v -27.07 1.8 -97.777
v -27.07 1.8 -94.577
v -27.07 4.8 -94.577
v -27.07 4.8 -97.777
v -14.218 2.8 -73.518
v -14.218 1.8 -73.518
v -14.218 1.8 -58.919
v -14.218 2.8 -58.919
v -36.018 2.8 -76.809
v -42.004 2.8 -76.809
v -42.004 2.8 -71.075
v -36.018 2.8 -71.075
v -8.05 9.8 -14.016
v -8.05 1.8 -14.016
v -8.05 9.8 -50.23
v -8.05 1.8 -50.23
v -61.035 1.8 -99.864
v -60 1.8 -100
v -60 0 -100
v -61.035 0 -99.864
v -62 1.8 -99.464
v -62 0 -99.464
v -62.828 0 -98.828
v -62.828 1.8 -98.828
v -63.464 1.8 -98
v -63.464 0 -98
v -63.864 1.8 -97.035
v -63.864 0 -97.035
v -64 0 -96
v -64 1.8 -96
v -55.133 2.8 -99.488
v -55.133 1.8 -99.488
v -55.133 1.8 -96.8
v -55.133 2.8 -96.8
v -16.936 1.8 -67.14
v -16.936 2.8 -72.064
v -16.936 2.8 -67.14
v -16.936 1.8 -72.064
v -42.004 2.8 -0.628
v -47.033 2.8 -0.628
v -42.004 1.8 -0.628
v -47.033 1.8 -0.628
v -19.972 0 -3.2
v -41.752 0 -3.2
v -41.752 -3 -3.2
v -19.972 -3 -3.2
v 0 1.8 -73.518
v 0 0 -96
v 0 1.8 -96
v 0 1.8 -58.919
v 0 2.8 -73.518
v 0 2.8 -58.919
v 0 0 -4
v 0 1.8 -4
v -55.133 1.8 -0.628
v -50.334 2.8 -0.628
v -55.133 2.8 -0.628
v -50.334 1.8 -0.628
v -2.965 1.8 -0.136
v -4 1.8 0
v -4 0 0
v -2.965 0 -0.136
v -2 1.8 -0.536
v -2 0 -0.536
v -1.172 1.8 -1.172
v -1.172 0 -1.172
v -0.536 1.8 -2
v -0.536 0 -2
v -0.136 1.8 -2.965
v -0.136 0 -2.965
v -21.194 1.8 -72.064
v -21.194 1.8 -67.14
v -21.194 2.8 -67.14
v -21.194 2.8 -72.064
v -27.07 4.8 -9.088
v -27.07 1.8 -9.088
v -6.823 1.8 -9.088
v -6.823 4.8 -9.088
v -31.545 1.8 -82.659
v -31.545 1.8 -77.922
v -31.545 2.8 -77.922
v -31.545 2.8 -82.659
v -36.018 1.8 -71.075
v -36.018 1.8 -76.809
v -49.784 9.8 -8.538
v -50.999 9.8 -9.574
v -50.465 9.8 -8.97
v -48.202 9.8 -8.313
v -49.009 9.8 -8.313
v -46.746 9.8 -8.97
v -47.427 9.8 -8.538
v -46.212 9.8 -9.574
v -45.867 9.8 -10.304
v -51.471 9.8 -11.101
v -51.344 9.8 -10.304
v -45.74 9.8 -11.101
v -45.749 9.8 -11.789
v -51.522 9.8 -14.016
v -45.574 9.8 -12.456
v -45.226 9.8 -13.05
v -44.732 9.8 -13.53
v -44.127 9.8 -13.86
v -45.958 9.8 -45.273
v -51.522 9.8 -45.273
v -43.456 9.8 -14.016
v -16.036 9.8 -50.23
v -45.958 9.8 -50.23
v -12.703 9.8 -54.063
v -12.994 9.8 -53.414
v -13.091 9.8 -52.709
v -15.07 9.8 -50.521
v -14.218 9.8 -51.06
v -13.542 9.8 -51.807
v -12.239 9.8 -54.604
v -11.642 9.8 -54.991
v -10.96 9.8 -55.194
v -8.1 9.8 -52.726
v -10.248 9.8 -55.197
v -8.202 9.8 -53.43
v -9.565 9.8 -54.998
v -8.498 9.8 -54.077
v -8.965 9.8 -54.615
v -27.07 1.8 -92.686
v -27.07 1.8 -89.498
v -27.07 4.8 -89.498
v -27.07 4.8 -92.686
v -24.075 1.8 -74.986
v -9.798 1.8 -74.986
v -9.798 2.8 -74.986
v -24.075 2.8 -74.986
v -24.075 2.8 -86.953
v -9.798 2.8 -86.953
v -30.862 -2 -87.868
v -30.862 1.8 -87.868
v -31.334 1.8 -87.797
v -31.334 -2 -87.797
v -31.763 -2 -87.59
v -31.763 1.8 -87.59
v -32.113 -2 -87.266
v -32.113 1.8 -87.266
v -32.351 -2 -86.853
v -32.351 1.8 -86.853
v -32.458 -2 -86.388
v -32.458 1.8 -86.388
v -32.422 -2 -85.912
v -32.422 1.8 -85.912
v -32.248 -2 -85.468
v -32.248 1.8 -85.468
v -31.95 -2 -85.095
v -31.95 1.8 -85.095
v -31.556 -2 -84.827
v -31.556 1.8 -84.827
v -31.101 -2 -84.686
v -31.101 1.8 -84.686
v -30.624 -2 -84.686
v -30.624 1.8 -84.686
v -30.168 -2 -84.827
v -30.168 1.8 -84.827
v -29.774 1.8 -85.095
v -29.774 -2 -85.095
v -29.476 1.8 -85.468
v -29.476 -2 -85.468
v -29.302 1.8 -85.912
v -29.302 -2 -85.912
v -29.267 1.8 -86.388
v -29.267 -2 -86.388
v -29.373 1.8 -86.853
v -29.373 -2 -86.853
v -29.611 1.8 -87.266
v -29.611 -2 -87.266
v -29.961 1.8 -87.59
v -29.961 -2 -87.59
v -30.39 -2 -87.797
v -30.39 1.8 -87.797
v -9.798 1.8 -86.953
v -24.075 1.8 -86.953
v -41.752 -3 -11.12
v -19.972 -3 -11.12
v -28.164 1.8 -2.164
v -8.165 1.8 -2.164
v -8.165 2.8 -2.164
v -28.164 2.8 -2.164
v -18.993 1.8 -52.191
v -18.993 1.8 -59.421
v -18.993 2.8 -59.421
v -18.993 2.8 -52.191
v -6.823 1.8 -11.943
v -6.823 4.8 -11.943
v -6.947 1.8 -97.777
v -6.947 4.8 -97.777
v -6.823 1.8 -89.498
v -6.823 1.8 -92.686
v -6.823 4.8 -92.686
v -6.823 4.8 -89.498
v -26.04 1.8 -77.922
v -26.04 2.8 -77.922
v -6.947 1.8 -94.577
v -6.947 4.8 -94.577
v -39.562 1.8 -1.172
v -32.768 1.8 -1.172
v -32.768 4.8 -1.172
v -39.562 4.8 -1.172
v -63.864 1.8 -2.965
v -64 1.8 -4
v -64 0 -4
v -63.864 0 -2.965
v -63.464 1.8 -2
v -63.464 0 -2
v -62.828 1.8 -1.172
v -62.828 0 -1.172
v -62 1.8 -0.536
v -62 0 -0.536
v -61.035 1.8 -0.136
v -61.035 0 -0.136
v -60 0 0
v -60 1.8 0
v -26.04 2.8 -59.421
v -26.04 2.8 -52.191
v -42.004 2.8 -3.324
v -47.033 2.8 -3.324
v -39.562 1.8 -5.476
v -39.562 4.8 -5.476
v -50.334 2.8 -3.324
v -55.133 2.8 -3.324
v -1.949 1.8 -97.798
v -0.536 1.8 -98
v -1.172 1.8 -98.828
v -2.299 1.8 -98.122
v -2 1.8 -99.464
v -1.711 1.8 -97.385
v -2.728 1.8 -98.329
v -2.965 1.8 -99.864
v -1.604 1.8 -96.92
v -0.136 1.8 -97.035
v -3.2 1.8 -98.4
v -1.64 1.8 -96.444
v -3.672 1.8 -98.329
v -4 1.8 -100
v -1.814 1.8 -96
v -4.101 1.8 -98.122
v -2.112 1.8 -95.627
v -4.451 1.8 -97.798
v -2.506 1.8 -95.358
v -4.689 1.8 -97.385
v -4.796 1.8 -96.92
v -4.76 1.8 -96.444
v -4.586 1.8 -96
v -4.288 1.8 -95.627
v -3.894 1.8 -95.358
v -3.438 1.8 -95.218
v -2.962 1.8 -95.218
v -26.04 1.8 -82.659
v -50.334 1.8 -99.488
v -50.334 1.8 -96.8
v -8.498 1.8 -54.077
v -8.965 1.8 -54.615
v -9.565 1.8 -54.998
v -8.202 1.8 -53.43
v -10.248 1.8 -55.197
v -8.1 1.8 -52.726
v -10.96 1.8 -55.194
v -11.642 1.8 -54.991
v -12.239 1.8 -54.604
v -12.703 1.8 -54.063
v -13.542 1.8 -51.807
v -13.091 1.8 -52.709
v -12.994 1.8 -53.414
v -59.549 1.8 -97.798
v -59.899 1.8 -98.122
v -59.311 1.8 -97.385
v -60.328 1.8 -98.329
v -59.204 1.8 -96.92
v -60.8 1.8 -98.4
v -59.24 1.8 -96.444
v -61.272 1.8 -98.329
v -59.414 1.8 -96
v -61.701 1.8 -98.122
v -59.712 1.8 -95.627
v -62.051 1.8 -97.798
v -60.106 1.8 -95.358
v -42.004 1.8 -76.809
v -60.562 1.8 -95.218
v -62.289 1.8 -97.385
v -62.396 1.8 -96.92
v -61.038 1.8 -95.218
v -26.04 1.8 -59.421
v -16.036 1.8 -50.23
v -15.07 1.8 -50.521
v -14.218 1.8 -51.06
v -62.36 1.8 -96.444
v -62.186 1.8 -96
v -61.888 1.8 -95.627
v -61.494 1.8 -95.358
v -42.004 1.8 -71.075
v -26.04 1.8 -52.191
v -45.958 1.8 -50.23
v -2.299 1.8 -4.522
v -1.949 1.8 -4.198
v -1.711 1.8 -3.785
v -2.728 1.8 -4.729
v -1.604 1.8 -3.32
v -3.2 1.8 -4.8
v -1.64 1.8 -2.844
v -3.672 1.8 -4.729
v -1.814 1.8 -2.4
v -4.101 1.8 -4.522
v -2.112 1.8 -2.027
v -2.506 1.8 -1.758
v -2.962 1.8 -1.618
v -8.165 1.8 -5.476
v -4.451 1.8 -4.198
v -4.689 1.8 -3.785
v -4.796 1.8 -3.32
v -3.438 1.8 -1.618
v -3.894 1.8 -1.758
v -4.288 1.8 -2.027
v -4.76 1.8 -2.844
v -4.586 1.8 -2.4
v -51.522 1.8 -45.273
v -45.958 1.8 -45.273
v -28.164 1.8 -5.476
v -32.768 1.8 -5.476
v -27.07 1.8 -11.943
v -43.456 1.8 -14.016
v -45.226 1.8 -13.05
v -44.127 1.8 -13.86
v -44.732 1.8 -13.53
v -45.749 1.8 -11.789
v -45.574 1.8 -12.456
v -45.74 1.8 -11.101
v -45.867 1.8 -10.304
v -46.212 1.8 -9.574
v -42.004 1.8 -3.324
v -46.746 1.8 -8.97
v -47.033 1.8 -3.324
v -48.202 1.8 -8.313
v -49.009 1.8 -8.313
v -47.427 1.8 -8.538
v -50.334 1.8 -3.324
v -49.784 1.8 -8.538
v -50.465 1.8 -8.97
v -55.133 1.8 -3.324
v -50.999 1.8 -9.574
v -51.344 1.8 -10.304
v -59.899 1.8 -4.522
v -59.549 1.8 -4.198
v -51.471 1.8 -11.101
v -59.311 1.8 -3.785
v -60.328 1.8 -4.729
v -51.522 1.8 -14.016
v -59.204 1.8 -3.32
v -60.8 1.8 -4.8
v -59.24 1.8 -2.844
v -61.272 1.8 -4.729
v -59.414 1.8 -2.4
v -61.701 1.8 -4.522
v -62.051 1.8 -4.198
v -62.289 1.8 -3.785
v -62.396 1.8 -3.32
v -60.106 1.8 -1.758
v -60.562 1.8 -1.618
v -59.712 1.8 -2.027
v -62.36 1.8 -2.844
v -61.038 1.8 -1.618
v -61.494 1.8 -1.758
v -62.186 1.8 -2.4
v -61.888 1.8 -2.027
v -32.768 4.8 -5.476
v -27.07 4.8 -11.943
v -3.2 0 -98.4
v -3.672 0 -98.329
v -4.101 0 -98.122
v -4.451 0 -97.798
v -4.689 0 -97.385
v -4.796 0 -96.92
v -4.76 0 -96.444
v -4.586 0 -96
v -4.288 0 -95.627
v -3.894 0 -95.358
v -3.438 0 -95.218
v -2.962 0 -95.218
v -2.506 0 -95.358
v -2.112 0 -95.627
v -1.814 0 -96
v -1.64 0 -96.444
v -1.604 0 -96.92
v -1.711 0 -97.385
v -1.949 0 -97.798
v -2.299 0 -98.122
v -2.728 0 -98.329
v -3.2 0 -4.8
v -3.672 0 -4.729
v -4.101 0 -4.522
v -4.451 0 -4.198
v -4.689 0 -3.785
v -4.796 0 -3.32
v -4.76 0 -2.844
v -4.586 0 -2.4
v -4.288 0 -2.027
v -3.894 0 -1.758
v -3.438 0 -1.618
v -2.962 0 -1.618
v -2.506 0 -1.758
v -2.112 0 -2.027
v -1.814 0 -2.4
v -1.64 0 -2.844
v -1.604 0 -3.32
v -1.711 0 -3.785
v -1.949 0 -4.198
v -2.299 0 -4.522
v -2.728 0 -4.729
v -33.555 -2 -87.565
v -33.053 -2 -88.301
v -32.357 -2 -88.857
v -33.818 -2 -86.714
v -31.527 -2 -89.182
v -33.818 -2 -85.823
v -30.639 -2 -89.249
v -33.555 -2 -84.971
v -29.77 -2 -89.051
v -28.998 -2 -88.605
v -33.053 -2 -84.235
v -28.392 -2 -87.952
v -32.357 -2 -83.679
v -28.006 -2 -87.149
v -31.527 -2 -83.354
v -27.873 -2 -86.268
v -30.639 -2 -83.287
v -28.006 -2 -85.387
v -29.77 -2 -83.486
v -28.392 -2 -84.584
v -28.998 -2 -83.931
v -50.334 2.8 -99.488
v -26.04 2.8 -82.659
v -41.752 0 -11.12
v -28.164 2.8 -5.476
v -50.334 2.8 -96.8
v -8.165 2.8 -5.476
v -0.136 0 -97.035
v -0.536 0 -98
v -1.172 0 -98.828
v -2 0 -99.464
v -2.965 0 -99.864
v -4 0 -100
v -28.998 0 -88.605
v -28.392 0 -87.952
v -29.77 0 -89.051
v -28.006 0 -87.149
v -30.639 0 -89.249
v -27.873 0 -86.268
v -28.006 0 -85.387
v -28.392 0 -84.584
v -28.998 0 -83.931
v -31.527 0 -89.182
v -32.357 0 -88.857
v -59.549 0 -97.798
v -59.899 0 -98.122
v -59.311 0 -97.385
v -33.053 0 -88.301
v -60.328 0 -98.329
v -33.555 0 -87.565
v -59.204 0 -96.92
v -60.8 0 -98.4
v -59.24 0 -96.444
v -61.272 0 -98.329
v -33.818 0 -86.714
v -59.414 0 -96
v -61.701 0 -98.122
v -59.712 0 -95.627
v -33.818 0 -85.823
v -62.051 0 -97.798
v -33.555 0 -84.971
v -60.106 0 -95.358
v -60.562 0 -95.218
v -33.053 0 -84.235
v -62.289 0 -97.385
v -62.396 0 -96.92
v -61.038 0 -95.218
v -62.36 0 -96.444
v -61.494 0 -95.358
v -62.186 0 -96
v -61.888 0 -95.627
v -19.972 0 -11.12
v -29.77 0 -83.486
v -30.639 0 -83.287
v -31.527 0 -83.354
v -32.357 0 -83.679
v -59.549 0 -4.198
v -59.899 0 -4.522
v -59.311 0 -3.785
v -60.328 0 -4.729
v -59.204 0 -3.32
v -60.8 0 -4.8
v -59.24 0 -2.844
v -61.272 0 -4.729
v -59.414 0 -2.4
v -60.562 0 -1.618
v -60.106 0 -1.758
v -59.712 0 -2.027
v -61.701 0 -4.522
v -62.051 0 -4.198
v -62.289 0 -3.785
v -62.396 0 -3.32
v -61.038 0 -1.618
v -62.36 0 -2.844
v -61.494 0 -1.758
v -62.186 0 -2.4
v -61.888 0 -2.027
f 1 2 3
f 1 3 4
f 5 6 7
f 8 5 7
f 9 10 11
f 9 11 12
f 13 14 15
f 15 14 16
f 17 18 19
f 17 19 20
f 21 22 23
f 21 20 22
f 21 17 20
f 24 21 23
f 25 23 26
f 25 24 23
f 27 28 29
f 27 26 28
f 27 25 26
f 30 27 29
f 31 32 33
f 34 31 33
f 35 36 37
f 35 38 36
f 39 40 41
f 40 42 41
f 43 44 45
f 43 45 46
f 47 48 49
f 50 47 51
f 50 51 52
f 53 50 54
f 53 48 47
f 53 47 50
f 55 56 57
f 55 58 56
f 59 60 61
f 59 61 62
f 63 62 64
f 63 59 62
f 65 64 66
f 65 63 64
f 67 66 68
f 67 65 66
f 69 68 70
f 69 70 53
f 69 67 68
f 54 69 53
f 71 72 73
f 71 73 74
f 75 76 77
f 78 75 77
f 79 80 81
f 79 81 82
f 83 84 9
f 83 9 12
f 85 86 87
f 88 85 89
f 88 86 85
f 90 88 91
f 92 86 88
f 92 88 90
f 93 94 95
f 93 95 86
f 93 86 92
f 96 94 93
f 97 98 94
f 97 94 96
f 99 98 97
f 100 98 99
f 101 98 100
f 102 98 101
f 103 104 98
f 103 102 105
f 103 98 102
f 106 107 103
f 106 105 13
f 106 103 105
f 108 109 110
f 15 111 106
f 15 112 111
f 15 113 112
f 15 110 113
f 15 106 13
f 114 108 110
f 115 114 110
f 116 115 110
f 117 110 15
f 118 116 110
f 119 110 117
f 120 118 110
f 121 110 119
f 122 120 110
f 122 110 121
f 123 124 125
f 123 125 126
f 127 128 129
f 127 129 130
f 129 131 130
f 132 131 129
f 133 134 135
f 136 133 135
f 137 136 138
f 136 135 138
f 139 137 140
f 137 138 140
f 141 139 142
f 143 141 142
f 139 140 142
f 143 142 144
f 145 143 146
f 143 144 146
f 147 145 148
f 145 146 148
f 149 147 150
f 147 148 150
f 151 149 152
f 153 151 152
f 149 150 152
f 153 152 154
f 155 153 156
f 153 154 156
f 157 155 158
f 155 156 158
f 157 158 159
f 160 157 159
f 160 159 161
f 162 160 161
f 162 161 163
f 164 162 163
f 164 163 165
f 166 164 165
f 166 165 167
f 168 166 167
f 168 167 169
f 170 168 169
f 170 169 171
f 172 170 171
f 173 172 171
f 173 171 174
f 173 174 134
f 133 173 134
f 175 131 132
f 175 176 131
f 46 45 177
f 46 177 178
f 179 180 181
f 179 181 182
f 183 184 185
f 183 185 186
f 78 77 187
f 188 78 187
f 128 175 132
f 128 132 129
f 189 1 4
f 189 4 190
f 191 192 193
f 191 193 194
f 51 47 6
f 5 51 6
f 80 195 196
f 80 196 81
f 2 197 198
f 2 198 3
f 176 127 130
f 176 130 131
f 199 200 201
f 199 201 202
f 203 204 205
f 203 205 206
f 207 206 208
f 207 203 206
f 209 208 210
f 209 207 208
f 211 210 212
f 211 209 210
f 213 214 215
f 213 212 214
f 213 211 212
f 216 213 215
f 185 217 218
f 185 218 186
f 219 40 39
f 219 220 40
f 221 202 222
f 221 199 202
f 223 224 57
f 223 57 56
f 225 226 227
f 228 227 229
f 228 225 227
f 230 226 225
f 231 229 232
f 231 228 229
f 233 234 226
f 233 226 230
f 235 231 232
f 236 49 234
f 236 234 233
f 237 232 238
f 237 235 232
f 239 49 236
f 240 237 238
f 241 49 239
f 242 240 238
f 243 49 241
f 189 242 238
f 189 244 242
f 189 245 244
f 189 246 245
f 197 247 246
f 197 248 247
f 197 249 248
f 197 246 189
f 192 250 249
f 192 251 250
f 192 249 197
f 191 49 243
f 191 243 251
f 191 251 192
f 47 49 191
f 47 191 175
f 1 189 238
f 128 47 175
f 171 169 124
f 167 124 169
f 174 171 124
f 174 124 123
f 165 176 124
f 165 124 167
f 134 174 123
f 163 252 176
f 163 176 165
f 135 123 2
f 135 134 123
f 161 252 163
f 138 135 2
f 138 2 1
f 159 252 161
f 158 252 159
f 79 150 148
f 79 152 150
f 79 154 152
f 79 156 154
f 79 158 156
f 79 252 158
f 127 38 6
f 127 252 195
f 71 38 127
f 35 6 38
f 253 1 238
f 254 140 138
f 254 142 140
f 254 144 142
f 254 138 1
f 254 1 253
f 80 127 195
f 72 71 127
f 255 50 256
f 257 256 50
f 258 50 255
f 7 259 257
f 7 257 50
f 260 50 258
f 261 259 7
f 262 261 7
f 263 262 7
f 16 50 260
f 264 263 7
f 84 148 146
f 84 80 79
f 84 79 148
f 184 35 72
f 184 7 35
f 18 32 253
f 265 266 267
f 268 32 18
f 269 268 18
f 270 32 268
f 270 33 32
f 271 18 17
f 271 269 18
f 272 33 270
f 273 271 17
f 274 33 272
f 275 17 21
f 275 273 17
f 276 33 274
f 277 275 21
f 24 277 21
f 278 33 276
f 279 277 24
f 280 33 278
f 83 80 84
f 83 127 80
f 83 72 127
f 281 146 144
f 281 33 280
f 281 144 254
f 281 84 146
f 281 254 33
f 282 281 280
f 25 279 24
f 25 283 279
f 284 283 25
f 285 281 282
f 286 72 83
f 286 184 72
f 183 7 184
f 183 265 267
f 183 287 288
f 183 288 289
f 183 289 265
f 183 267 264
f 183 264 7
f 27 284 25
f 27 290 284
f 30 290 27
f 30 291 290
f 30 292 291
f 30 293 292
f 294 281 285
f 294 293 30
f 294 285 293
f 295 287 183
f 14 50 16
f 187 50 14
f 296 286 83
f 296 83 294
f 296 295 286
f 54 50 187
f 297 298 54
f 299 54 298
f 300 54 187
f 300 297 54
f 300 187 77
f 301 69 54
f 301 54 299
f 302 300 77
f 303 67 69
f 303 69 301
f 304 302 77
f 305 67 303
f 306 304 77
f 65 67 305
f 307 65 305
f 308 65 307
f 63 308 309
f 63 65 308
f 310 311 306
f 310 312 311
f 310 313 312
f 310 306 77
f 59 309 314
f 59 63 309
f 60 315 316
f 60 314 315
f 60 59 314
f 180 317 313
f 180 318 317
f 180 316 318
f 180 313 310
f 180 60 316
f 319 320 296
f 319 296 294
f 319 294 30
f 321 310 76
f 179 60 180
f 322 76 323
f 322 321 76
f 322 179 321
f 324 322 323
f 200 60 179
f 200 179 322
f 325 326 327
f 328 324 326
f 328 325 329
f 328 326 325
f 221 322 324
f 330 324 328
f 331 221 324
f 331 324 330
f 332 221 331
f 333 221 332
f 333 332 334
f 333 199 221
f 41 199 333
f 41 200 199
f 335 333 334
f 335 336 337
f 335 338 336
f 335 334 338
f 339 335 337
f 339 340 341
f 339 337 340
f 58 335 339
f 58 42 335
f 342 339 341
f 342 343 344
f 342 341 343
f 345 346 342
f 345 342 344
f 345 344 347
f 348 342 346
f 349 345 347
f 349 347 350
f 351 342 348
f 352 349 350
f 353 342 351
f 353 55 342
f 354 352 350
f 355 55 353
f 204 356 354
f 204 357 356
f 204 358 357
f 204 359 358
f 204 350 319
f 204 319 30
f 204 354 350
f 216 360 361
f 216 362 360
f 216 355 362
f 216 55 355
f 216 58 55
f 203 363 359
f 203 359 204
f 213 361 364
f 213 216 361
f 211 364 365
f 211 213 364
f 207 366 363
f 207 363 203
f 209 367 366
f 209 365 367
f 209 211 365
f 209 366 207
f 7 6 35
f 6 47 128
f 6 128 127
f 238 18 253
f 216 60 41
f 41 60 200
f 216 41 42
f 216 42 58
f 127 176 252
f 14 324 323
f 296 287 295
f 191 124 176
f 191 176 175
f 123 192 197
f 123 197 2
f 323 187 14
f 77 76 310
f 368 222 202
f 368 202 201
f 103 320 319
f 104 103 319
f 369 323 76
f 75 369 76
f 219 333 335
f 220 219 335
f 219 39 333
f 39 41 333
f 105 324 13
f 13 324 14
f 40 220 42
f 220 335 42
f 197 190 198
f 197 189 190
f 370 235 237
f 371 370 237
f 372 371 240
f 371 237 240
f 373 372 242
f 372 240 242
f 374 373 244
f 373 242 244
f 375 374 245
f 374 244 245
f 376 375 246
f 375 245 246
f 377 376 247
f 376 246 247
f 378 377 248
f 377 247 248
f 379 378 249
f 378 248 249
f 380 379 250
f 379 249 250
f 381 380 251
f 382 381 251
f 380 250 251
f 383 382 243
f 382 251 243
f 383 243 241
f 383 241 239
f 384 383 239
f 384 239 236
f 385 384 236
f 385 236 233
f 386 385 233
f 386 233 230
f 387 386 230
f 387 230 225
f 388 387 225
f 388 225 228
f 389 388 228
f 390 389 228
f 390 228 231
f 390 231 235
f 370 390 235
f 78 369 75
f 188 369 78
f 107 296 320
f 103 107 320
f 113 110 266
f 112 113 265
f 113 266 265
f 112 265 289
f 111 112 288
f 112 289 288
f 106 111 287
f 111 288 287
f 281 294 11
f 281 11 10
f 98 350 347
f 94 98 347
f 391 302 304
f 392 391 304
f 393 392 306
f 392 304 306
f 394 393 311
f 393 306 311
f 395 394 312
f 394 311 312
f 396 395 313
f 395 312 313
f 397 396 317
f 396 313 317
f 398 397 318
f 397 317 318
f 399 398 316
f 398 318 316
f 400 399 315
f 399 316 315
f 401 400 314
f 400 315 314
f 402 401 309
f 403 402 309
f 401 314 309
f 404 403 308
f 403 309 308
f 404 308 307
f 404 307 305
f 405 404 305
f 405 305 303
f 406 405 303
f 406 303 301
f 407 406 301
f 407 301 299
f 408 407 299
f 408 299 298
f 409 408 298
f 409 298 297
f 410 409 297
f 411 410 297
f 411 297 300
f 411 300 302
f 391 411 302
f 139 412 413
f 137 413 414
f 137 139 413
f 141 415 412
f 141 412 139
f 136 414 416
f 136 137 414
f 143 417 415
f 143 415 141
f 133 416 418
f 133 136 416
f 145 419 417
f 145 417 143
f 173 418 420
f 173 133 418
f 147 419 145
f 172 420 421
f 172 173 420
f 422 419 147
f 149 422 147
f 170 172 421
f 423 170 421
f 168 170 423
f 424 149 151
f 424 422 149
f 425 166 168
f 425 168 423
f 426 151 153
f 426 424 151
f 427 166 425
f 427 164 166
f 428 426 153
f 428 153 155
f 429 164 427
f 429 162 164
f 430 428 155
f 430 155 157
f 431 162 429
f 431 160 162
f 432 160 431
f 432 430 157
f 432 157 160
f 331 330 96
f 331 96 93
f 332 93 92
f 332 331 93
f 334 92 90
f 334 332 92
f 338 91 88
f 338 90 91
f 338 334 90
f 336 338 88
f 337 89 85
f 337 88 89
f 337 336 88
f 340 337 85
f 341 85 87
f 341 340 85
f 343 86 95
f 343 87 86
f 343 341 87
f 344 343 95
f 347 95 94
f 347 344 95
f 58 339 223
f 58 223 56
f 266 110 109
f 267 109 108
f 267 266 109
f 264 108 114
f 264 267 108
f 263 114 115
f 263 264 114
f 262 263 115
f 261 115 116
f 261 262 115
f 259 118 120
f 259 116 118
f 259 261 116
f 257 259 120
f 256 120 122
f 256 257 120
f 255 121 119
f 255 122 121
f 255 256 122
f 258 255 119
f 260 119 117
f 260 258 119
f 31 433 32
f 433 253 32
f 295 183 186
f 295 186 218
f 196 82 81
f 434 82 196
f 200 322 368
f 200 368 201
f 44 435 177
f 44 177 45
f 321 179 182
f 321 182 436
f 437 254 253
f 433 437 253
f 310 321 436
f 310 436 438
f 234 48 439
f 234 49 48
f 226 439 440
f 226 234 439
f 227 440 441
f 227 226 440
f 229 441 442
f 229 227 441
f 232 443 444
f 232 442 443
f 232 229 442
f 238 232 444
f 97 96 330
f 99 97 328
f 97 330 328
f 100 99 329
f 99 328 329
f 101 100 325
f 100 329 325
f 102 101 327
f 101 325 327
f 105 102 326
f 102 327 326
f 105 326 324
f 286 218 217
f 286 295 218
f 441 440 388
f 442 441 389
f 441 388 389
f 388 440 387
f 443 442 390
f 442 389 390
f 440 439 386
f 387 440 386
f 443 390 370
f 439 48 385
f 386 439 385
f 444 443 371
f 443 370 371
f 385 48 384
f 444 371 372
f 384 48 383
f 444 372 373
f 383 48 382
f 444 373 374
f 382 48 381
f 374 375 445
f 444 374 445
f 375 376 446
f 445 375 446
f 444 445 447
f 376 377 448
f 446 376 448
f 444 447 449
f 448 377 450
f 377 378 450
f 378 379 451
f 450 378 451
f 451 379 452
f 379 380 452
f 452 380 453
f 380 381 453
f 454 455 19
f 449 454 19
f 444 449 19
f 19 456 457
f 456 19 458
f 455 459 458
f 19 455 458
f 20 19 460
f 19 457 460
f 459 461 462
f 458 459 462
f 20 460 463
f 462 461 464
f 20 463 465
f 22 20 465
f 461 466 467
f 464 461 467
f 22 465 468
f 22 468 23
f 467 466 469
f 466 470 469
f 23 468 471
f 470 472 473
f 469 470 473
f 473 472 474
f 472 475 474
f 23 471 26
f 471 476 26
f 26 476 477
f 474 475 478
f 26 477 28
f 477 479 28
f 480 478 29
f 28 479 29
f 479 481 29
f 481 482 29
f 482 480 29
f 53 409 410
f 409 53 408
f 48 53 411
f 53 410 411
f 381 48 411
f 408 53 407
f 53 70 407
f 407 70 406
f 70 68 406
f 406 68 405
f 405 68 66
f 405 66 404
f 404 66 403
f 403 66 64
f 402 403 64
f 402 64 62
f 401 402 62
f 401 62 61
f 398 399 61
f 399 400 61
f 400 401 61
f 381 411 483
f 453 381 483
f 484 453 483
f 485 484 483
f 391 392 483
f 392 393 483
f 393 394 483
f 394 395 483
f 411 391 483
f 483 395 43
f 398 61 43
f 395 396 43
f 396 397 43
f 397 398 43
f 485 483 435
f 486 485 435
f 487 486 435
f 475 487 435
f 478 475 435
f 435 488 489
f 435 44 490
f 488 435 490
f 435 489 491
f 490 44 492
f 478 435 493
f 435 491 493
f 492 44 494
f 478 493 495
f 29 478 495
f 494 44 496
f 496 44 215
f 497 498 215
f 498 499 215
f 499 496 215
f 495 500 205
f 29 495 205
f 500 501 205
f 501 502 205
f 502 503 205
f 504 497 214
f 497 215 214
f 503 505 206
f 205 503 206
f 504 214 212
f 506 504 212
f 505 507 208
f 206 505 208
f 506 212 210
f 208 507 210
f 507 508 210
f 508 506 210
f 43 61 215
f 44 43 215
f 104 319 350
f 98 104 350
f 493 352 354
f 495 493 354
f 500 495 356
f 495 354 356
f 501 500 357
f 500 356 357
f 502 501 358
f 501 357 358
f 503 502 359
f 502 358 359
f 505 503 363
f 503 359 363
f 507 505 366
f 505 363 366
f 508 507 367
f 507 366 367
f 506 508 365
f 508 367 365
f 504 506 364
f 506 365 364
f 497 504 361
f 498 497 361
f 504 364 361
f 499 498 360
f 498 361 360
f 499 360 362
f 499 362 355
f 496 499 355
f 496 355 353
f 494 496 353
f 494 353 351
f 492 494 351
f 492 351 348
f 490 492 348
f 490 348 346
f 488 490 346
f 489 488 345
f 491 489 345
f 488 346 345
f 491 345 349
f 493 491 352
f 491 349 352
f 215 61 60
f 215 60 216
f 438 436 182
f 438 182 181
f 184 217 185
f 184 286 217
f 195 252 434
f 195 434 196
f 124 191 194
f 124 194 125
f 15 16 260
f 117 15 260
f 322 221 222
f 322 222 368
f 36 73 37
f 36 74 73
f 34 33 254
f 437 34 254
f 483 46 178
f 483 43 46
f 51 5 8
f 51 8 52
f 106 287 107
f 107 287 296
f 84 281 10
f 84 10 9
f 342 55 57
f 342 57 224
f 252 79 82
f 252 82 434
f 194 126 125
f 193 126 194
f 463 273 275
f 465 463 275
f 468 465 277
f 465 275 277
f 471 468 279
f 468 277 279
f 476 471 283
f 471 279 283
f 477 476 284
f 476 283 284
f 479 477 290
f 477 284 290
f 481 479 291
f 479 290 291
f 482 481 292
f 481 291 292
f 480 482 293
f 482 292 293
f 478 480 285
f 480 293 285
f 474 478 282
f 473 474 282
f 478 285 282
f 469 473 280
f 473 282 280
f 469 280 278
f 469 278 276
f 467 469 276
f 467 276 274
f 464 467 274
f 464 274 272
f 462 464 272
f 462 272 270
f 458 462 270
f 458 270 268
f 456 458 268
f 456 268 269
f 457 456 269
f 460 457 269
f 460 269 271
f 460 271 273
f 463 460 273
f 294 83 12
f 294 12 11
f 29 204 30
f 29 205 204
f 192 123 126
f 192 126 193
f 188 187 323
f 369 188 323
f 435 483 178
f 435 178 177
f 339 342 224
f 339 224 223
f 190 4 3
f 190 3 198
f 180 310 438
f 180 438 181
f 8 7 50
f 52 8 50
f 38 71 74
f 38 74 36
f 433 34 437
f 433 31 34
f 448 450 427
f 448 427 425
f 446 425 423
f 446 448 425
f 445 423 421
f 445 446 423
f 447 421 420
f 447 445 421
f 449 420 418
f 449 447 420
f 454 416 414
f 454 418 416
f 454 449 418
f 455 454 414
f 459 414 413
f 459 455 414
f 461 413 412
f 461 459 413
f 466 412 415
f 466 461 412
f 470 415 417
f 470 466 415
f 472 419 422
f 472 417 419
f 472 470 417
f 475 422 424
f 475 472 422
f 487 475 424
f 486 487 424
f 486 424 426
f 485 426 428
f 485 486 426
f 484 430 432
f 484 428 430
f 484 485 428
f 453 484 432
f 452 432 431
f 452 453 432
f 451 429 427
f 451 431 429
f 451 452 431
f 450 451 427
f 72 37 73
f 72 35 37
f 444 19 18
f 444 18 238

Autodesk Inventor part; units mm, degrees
ref_plane "YZ Plane" through (0, 0, 0) normal (1, 0, 0) x (0, 1, 0)
ref_plane "XZ Plane" through (0, 0, 0) normal (0, 1, 0) x (-1, 0, 0)
ref_plane "XY Plane" through (0, 0, 0) normal (0, 0, 1) x (1, 0, 0)
sketch "Sketch1" plane through (0, 0, 0) normal (0, 1, 0) x (-1, 0, 0)
  line L0 (0, 0) -> (64, 0)
  line L1 (64, 0) -> (64, -100)
  line L2 (64, -100) -> (0, -100)
  line L3 (0, -100) -> (0, 0)
  dimension "d0" = 64
  dimension "d1" = 100
extrude "Extrusion1" add sketch "Sketch1" along normal blind 1.8
fillet "Fillet1" radius 4 4 edges at (-64, 0.9, 0) (0, 0.9, 0) (0, 0.9, -100) (-64, 0.9, -100)
sketch "Sketch2" plane through (0, 0, 0) normal (0, -1, 0) x (1, 0, 0)
  arc A0 (-64, -96) -> (-60, -100) centre (-60, -96) ccw projected
  arc A1 (-4, -100) -> (0, -96) centre (-4, -96) ccw projected
  arc A2 (0, -4) -> (-4, 0) centre (-4, -4) ccw projected
  arc A3 (-60, 0) -> (-64, -4) centre (-60, -4) ccw projected
  line L0 (-64, -4) -> (-64, -96) projected
  line L1 (-60, -100) -> (-60, -96)
  line L2 (-60, -96) -> (-64, -96)
  line L3 (0, -96) -> (-4, -96)
  line L4 (-4, -96) -> (-4, -100)
  line L5 (0, -4) -> (-4, -4)
  line L6 (-4, -4) -> (-4, 0)
  line L7 (-60, 0) -> (-60, -4)
  line L8 (-60, -4) -> (-64, -4)
  point P0 (0, 0)
  point P1 (-60.8, -96.8)
  point P2 (-3.2, -96.8)
  point P3 (-3.2, -3.2)
  point P4 (-60.8, -3.2)
  dimension "d5" = 4
  dimension "d6" = 0.8
  dimension "d7" = 0.8
  dimension "d8" = 0.8
  dimension "d9" = 0.8
  dimension "d10" = 0.8
  dimension "d11" = 0.8
  dimension "d12" = 0.8
  dimension "d13" = 0.8
hole "Hole1" at (-60.8, 0, -96.8) at (-3.2, 0, -96.8) at (-3.2, 0, -3.2) at (-60.8, 0, -3.2) direction (0, 1, 0) diameter 3.2 end through all
sketch "Sketch3" plane through (0, 1.8, 0) normal (0, 1, 0) x (1, 0, 0)
  line L0 (-24.0749, 86.9532) -> (-9.798, 86.9532)
  line L1 (-9.798, 86.9532) -> (-9.798, 74.9855)
  line L2 (-9.798, 74.9855) -> (-24.0749, 74.9855)
  line L3 (-24.0749, 74.9855) -> (-24.0749, 86.9532)
  line L4 (-42.004, 76.8088) -> (-36.0181, 76.8088)
  line L5 (-36.0181, 76.8088) -> (-36.0181, 71.0747)
  line L6 (-36.0181, 71.0747) -> (-42.004, 71.0747)
  line L7 (-42.004, 71.0747) -> (-42.004, 76.8088)
  line L8 (-26.0395, 59.4207) -> (-18.9932, 59.4207)
  line L9 (-18.9932, 59.4207) -> (-18.9932, 52.191)
  line L10 (-18.9932, 52.191) -> (-26.0395, 52.191)
  line L11 (-26.0395, 52.191) -> (-26.0395, 59.4207)
  line L12 (-21.1941, 72.0637) -> (-16.9365, 72.0637)
  line L13 (-16.9365, 72.0637) -> (-16.9365, 67.1402)
  line L14 (-16.9365, 67.1402) -> (-21.1941, 67.1402)
  line L15 (-21.1941, 67.1402) -> (-21.1941, 72.0637)
  line L16 (-31.5453, 82.6589) -> (-26.0395, 82.6589)
  line L17 (-26.0395, 82.6589) -> (-26.0395, 77.9216)
  line L18 (-26.0395, 77.9216) -> (-31.5453, 77.9216)
  line L19 (-31.5453, 77.9216) -> (-31.5453, 82.6589)
  line L20 (-27.0702, 92.6857) -> (-6.8232, 92.6857)
  line L21 (-6.8232, 92.6857) -> (-6.8232, 89.4983)
  line L22 (-6.8232, 89.4983) -> (-27.0702, 89.4983)
  line L23 (-27.0702, 89.4983) -> (-27.0702, 92.6857)
  line L24 (-27.0702, 97.7771) -> (-6.9471, 97.7771)
  line L25 (-6.9471, 97.7771) -> (-6.9471, 94.5771)
  line L26 (-6.9471, 94.5771) -> (-27.0702, 94.5771)
  line L27 (-27.0702, 94.5771) -> (-27.0702, 97.7771)
  line L28 (-27.0702, 9.0883) -> (-6.8232, 9.0883)
  line L29 (-6.8232, 9.0883) -> (-6.8232, 11.9431)
  line L30 (-6.8232, 11.9431) -> (-27.0702, 11.9431)
  line L31 (-27.0702, 11.9431) -> (-27.0702, 9.0883)
  line L32 (-28.1635, 5.4758) -> (-8.1648, 5.4758)
  line L33 (-8.1648, 5.4758) -> (-8.1648, 2.1639)
  line L34 (-8.1648, 2.1639) -> (-28.1635, 2.1639)
  line L35 (-28.1635, 2.1639) -> (-28.1635, 5.4758)
  line L36 (-39.5623, 5.4758) -> (-32.7683, 5.4758)
  line L37 (-32.7683, 5.4758) -> (-32.7683, 1.1716)
  line L38 (-32.7683, 1.1716) -> (-39.5623, 1.1716)
  line L39 (-39.5623, 1.1716) -> (-39.5623, 5.4758)
  line L40 (-55.1326, 3.3237) -> (-50.3337, 3.3237)
  line L41 (-50.3337, 3.3237) -> (-50.3337, 0.6285)
  line L42 (-50.3337, 0.6285) -> (-55.1326, 0.6285)
  line L43 (-55.1326, 0.6285) -> (-55.1326, 3.3237)
  line L44 (-47.0326, 0.6285) -> (-42.004, 0.6285)
  line L45 (-42.004, 0.6285) -> (-42.004, 3.3237)
  line L46 (-42.004, 3.3237) -> (-47.0326, 3.3237)
  line L47 (-47.0326, 3.3237) -> (-47.0326, 0.6285)
  line L48 (-55.1326, 96.8) -> (-50.3337, 96.8)
  line L49 (-50.3337, 96.8) -> (-50.3337, 99.4879)
  line L50 (-50.3337, 99.4879) -> (-55.1326, 99.4879)
  line L51 (-55.1326, 99.4879) -> (-55.1326, 96.8)
  point P0 (0, 0)
extrude "Extrusion2" add sketch "Sketch3" along normal blind 1 contours L0 L1 L2 L3 | L4 L5 L6 L7 | L8 L9 L10 L11 | L12 L13 L14 L15 | L16 L17 L18 L19 | L32 L33 L34 L35
extrude "Extrusion3" add sketch "Sketch3" along normal blind 3 contours L20 L21 L22 L23 | L24 L25 L26 L27 | L31 L30 L29 L28
extrude "Extrusion4" add sketch "Sketch3" along normal blind 1 contours L40 L41 L42 L43 | L47 L46 L45 L44 | L51 L50 L49 L48
extrude "Extrusion5" add sketch "Sketch3" along normal blind 3 contours L36 L37 L38 L39
sketch "Sketch4" plane through (0, 1.8, 0) normal (0, 1, 0) x (1, 0, 0)
  line L0 (-32.7683, 5.4758) -> (-32.7683, 1.1716) projected
  line L1 (-32.7683, 1.1716) -> (-39.5623, 1.1716) projected
  line L2 (-39.5623, 1.1716) -> (-39.5623, 5.4758) projected
  line L3 (-39.5623, 5.4758) -> (-32.7683, 5.4758) projected
  line L4 (-50.3337, 3.3237) -> (-50.3337, 0.6285) projected
  line L5 (-50.3337, 0.6285) -> (-55.1326, 0.6285) projected
  line L6 (-55.1326, 0.6285) -> (-55.1326, 3.3237) projected
  line L7 (-55.1326, 3.3237) -> (-50.3337, 3.3237) projected
  line L8 (-55.1326, 96.8) -> (-55.1326, 99.4879) projected
  line L9 (-55.1326, 99.4879) -> (-50.3337, 99.4879) projected
  line L10 (-50.3337, 99.4879) -> (-50.3337, 96.8) projected
  line L11 (-50.3337, 96.8) -> (-55.1326, 96.8) projected
  line L12 (-47.0326, 0.6285) -> (-47.0326, 3.3237) projected
  line L13 (-47.0326, 3.3237) -> (-42.004, 3.3237) projected
  line L14 (-42.004, 3.3237) -> (-42.004, 0.6285) projected
  line L15 (-42.004, 0.6285) -> (-47.0326, 0.6285) projected
  line L16 (-6.9471, 97.7771) -> (-6.9471, 94.5771) projected
  line L17 (-6.9471, 94.5771) -> (-27.0702, 94.5771) projected
  line L18 (-27.0702, 94.5771) -> (-27.0702, 97.7771) projected
  line L19 (-27.0702, 97.7771) -> (-6.9471, 97.7771) projected
  line L20 (-27.0702, 9.0883) -> (-27.0702, 11.9431) projected
  line L21 (-27.0702, 11.9431) -> (-6.8232, 11.9431) projected
  line L22 (-6.8232, 11.9431) -> (-6.8232, 9.0883) projected
  line L23 (-6.8232, 9.0883) -> (-27.0702, 9.0883) projected
  line L24 (-6.8232, 92.6857) -> (-6.8232, 89.4983) projected
  line L25 (-6.8232, 89.4983) -> (-27.0702, 89.4983) projected
  line L26 (-27.0702, 89.4983) -> (-27.0702, 92.6857) projected
  line L27 (-27.0702, 92.6857) -> (-6.8232, 92.6857) projected
  line L28 (-8.1648, 5.4758) -> (-8.1648, 2.1639) projected
  line L29 (-8.1648, 2.1639) -> (-28.1635, 2.1639) projected
  line L30 (-28.1635, 2.1639) -> (-28.1635, 5.4758) projected
  line L31 (-28.1635, 5.4758) -> (-8.1648, 5.4758) projected
  line L32 (-36.0181, 76.8088) -> (-36.0181, 71.0747) projected
  line L33 (-36.0181, 71.0747) -> (-42.004, 71.0747) projected
  line L34 (-42.004, 71.0747) -> (-42.004, 76.8088) projected
  line L35 (-42.004, 76.8088) -> (-36.0181, 76.8088) projected
  line L36 (-16.9365, 72.0637) -> (-16.9365, 67.1402) projected
  line L37 (-16.9365, 67.1402) -> (-21.1941, 67.1402) projected
  line L38 (-21.1941, 67.1402) -> (-21.1941, 72.0637) projected
  line L39 (-21.1941, 72.0637) -> (-16.9365, 72.0637) projected
  line L40 (-26.0395, 82.6589) -> (-26.0395, 77.9216) projected
  line L41 (-26.0395, 77.9216) -> (-31.5453, 77.9216) projected
  line L42 (-31.5453, 77.9216) -> (-31.5453, 82.6589) projected
  line L43 (-31.5453, 82.6589) -> (-26.0395, 82.6589) projected
  line L44 (-18.9932, 59.4207) -> (-18.9932, 52.191) projected
  line L45 (-18.9932, 52.191) -> (-26.0395, 52.191) projected
  line L46 (-26.0395, 52.191) -> (-26.0395, 59.4207) projected
  line L47 (-26.0395, 59.4207) -> (-18.9932, 59.4207) projected
  line L48 (-9.798, 86.9532) -> (-9.798, 74.9855) projected
  line L49 (-9.798, 74.9855) -> (-24.0749, 74.9855) projected
  line L50 (-24.0749, 74.9855) -> (-24.0749, 86.9532) projected
  line L51 (-24.0749, 86.9532) -> (-9.798, 86.9532) projected
  circle A0 centre (-3.2, 3.2) radius 1.6 projected
  circle A1 centre (-60.8, 96.8) radius 1.6 projected
  circle A2 centre (-3.2, 96.8) radius 1.6 projected
  circle A3 centre (-60.8, 3.2) radius 1.6 projected
  arc A4 (-60, 100) -> (-64, 96) centre (-60, 96) ccw projected
  line L52 (-64, 96) -> (-64, 4) projected
  arc A5 (-64, 4) -> (-60, 0) centre (-60, 4) ccw projected
  line L53 (-60, 0) -> (-4, 0) projected
  arc A6 (-4, 0) -> (0, 4) centre (-4, 4) ccw projected
  line L54 (0, 4) -> (0, 96) projected
  arc A7 (0, 96) -> (-4, 100) centre (-4, 96) ccw projected
  line L55 (-4, 100) -> (-60, 100) projected
  point P0 (0, 0)
sketch "Sketch5" plane through (0, 1.8, 0) normal (0, 1, 0) x (1, 0, 0)
  line L0 (-51.5216, 14.0163) -> (-8.0501, 14.0163)
  line L1 (-8.0501, 14.0163) -> (-8.0501, 50.2303)
  line L2 (-8.0501, 50.2303) -> (-51.5216, 50.2303)
  line L3 (-51.5216, 50.2303) -> (-51.5216, 14.0163)
  line L4 (-51.5216, 50.2303) -> (-45.958, 50.2303)
  line L5 (-45.958, 50.2303) -> (-45.958, 45.2733)
  line L6 (-45.958, 45.2733) -> (-51.5216, 45.2733)
  line L7 (-51.5216, 45.2733) -> (-51.5216, 50.2303)
  circle A0 centre (-48.6054, 11.1502) radius 2.866
  line L8 (-51.5216, 14.0163) -> (-51.471, 11.1006)
  arc A1 (-43.4561, 14.0163) -> (-45.7398, 11.1006) centre (-43.2203, 11.4794) ccw
  circle A2 centre (-10.5958, 52.7257) radius 2.4954
  line L9 (-8.0501, 50.2303) -> (-8.1009, 52.7756)
  arc A3 (-16.0357, 50.2303) -> (-13.0911, 52.7088) centre (-16.6158, 53.908) ccw
  point P0 (0, 0)
extrude "Extrusion6" add sketch "Sketch5" along normal blind 8 contours L0 L3 L6 L5 L2 L1 | A1 A0 L0 | A0 L8 L0 | A0 A1 | L2 A2 L9 | L2 A3 A2 | A2 picked at (-49.5355, 10.9245)
sketch "Sketch7" plane through (0, 0, 0) normal (0, -1, 0) x (1, 0, 0)
  line L0 (-41.7523, -3.2) -> (-19.972, -3.2)
  line L1 (-19.972, -3.2) -> (-19.972, -11.1201)
  line L2 (-19.972, -11.1201) -> (-41.7523, -11.1201)
  line L3 (-41.7523, -11.1201) -> (-41.7523, -3.2)
  point P0 (0, 0)
extrude "Extrusion7" add sketch "Sketch7" along normal blind 3
sketch "Sketch8" plane through (0, 0, 0) normal (0, -1, 0) x (1, 0, 0)
  circle A0 centre (-30.8621, -86.2682) radius 2.9892
  point P0 (0, 0)
extrude "Extrusion8" add sketch "Sketch8" along normal blind 2
sketch "Sketch9" plane through (-30.8621, -2, -86.2682) normal (0, -1, 0) x (1, 0, 0)
  circle A0 centre (0, 0) radius 2.9892 projected
  point P0 (30.8621, 86.2682)
hole "Hole2" at (-30.8621, -2, -86.2682) direction (0, 1, 0) diameter 3.2 end through all
sketch "Sketch10" plane through (0, 1.8, 0) normal (0, 1, 0) x (1, 0, 0)
  line L0 (0, 4) -> (0, 96) projected
  line L1 (0, 73.518) -> (-14.2183, 73.518)
  line L2 (-14.2183, 73.518) -> (-14.2183, 58.9192)
  line L3 (-14.2183, 58.9192) -> (0, 58.9192)
  line L4 (0, 58.9192) -> (0, 73.518)
  point P0 (0, 0)
extrude "Extrusion9" add sketch "Sketch10" along normal blind 1
properties part number "nanopc_t4"
